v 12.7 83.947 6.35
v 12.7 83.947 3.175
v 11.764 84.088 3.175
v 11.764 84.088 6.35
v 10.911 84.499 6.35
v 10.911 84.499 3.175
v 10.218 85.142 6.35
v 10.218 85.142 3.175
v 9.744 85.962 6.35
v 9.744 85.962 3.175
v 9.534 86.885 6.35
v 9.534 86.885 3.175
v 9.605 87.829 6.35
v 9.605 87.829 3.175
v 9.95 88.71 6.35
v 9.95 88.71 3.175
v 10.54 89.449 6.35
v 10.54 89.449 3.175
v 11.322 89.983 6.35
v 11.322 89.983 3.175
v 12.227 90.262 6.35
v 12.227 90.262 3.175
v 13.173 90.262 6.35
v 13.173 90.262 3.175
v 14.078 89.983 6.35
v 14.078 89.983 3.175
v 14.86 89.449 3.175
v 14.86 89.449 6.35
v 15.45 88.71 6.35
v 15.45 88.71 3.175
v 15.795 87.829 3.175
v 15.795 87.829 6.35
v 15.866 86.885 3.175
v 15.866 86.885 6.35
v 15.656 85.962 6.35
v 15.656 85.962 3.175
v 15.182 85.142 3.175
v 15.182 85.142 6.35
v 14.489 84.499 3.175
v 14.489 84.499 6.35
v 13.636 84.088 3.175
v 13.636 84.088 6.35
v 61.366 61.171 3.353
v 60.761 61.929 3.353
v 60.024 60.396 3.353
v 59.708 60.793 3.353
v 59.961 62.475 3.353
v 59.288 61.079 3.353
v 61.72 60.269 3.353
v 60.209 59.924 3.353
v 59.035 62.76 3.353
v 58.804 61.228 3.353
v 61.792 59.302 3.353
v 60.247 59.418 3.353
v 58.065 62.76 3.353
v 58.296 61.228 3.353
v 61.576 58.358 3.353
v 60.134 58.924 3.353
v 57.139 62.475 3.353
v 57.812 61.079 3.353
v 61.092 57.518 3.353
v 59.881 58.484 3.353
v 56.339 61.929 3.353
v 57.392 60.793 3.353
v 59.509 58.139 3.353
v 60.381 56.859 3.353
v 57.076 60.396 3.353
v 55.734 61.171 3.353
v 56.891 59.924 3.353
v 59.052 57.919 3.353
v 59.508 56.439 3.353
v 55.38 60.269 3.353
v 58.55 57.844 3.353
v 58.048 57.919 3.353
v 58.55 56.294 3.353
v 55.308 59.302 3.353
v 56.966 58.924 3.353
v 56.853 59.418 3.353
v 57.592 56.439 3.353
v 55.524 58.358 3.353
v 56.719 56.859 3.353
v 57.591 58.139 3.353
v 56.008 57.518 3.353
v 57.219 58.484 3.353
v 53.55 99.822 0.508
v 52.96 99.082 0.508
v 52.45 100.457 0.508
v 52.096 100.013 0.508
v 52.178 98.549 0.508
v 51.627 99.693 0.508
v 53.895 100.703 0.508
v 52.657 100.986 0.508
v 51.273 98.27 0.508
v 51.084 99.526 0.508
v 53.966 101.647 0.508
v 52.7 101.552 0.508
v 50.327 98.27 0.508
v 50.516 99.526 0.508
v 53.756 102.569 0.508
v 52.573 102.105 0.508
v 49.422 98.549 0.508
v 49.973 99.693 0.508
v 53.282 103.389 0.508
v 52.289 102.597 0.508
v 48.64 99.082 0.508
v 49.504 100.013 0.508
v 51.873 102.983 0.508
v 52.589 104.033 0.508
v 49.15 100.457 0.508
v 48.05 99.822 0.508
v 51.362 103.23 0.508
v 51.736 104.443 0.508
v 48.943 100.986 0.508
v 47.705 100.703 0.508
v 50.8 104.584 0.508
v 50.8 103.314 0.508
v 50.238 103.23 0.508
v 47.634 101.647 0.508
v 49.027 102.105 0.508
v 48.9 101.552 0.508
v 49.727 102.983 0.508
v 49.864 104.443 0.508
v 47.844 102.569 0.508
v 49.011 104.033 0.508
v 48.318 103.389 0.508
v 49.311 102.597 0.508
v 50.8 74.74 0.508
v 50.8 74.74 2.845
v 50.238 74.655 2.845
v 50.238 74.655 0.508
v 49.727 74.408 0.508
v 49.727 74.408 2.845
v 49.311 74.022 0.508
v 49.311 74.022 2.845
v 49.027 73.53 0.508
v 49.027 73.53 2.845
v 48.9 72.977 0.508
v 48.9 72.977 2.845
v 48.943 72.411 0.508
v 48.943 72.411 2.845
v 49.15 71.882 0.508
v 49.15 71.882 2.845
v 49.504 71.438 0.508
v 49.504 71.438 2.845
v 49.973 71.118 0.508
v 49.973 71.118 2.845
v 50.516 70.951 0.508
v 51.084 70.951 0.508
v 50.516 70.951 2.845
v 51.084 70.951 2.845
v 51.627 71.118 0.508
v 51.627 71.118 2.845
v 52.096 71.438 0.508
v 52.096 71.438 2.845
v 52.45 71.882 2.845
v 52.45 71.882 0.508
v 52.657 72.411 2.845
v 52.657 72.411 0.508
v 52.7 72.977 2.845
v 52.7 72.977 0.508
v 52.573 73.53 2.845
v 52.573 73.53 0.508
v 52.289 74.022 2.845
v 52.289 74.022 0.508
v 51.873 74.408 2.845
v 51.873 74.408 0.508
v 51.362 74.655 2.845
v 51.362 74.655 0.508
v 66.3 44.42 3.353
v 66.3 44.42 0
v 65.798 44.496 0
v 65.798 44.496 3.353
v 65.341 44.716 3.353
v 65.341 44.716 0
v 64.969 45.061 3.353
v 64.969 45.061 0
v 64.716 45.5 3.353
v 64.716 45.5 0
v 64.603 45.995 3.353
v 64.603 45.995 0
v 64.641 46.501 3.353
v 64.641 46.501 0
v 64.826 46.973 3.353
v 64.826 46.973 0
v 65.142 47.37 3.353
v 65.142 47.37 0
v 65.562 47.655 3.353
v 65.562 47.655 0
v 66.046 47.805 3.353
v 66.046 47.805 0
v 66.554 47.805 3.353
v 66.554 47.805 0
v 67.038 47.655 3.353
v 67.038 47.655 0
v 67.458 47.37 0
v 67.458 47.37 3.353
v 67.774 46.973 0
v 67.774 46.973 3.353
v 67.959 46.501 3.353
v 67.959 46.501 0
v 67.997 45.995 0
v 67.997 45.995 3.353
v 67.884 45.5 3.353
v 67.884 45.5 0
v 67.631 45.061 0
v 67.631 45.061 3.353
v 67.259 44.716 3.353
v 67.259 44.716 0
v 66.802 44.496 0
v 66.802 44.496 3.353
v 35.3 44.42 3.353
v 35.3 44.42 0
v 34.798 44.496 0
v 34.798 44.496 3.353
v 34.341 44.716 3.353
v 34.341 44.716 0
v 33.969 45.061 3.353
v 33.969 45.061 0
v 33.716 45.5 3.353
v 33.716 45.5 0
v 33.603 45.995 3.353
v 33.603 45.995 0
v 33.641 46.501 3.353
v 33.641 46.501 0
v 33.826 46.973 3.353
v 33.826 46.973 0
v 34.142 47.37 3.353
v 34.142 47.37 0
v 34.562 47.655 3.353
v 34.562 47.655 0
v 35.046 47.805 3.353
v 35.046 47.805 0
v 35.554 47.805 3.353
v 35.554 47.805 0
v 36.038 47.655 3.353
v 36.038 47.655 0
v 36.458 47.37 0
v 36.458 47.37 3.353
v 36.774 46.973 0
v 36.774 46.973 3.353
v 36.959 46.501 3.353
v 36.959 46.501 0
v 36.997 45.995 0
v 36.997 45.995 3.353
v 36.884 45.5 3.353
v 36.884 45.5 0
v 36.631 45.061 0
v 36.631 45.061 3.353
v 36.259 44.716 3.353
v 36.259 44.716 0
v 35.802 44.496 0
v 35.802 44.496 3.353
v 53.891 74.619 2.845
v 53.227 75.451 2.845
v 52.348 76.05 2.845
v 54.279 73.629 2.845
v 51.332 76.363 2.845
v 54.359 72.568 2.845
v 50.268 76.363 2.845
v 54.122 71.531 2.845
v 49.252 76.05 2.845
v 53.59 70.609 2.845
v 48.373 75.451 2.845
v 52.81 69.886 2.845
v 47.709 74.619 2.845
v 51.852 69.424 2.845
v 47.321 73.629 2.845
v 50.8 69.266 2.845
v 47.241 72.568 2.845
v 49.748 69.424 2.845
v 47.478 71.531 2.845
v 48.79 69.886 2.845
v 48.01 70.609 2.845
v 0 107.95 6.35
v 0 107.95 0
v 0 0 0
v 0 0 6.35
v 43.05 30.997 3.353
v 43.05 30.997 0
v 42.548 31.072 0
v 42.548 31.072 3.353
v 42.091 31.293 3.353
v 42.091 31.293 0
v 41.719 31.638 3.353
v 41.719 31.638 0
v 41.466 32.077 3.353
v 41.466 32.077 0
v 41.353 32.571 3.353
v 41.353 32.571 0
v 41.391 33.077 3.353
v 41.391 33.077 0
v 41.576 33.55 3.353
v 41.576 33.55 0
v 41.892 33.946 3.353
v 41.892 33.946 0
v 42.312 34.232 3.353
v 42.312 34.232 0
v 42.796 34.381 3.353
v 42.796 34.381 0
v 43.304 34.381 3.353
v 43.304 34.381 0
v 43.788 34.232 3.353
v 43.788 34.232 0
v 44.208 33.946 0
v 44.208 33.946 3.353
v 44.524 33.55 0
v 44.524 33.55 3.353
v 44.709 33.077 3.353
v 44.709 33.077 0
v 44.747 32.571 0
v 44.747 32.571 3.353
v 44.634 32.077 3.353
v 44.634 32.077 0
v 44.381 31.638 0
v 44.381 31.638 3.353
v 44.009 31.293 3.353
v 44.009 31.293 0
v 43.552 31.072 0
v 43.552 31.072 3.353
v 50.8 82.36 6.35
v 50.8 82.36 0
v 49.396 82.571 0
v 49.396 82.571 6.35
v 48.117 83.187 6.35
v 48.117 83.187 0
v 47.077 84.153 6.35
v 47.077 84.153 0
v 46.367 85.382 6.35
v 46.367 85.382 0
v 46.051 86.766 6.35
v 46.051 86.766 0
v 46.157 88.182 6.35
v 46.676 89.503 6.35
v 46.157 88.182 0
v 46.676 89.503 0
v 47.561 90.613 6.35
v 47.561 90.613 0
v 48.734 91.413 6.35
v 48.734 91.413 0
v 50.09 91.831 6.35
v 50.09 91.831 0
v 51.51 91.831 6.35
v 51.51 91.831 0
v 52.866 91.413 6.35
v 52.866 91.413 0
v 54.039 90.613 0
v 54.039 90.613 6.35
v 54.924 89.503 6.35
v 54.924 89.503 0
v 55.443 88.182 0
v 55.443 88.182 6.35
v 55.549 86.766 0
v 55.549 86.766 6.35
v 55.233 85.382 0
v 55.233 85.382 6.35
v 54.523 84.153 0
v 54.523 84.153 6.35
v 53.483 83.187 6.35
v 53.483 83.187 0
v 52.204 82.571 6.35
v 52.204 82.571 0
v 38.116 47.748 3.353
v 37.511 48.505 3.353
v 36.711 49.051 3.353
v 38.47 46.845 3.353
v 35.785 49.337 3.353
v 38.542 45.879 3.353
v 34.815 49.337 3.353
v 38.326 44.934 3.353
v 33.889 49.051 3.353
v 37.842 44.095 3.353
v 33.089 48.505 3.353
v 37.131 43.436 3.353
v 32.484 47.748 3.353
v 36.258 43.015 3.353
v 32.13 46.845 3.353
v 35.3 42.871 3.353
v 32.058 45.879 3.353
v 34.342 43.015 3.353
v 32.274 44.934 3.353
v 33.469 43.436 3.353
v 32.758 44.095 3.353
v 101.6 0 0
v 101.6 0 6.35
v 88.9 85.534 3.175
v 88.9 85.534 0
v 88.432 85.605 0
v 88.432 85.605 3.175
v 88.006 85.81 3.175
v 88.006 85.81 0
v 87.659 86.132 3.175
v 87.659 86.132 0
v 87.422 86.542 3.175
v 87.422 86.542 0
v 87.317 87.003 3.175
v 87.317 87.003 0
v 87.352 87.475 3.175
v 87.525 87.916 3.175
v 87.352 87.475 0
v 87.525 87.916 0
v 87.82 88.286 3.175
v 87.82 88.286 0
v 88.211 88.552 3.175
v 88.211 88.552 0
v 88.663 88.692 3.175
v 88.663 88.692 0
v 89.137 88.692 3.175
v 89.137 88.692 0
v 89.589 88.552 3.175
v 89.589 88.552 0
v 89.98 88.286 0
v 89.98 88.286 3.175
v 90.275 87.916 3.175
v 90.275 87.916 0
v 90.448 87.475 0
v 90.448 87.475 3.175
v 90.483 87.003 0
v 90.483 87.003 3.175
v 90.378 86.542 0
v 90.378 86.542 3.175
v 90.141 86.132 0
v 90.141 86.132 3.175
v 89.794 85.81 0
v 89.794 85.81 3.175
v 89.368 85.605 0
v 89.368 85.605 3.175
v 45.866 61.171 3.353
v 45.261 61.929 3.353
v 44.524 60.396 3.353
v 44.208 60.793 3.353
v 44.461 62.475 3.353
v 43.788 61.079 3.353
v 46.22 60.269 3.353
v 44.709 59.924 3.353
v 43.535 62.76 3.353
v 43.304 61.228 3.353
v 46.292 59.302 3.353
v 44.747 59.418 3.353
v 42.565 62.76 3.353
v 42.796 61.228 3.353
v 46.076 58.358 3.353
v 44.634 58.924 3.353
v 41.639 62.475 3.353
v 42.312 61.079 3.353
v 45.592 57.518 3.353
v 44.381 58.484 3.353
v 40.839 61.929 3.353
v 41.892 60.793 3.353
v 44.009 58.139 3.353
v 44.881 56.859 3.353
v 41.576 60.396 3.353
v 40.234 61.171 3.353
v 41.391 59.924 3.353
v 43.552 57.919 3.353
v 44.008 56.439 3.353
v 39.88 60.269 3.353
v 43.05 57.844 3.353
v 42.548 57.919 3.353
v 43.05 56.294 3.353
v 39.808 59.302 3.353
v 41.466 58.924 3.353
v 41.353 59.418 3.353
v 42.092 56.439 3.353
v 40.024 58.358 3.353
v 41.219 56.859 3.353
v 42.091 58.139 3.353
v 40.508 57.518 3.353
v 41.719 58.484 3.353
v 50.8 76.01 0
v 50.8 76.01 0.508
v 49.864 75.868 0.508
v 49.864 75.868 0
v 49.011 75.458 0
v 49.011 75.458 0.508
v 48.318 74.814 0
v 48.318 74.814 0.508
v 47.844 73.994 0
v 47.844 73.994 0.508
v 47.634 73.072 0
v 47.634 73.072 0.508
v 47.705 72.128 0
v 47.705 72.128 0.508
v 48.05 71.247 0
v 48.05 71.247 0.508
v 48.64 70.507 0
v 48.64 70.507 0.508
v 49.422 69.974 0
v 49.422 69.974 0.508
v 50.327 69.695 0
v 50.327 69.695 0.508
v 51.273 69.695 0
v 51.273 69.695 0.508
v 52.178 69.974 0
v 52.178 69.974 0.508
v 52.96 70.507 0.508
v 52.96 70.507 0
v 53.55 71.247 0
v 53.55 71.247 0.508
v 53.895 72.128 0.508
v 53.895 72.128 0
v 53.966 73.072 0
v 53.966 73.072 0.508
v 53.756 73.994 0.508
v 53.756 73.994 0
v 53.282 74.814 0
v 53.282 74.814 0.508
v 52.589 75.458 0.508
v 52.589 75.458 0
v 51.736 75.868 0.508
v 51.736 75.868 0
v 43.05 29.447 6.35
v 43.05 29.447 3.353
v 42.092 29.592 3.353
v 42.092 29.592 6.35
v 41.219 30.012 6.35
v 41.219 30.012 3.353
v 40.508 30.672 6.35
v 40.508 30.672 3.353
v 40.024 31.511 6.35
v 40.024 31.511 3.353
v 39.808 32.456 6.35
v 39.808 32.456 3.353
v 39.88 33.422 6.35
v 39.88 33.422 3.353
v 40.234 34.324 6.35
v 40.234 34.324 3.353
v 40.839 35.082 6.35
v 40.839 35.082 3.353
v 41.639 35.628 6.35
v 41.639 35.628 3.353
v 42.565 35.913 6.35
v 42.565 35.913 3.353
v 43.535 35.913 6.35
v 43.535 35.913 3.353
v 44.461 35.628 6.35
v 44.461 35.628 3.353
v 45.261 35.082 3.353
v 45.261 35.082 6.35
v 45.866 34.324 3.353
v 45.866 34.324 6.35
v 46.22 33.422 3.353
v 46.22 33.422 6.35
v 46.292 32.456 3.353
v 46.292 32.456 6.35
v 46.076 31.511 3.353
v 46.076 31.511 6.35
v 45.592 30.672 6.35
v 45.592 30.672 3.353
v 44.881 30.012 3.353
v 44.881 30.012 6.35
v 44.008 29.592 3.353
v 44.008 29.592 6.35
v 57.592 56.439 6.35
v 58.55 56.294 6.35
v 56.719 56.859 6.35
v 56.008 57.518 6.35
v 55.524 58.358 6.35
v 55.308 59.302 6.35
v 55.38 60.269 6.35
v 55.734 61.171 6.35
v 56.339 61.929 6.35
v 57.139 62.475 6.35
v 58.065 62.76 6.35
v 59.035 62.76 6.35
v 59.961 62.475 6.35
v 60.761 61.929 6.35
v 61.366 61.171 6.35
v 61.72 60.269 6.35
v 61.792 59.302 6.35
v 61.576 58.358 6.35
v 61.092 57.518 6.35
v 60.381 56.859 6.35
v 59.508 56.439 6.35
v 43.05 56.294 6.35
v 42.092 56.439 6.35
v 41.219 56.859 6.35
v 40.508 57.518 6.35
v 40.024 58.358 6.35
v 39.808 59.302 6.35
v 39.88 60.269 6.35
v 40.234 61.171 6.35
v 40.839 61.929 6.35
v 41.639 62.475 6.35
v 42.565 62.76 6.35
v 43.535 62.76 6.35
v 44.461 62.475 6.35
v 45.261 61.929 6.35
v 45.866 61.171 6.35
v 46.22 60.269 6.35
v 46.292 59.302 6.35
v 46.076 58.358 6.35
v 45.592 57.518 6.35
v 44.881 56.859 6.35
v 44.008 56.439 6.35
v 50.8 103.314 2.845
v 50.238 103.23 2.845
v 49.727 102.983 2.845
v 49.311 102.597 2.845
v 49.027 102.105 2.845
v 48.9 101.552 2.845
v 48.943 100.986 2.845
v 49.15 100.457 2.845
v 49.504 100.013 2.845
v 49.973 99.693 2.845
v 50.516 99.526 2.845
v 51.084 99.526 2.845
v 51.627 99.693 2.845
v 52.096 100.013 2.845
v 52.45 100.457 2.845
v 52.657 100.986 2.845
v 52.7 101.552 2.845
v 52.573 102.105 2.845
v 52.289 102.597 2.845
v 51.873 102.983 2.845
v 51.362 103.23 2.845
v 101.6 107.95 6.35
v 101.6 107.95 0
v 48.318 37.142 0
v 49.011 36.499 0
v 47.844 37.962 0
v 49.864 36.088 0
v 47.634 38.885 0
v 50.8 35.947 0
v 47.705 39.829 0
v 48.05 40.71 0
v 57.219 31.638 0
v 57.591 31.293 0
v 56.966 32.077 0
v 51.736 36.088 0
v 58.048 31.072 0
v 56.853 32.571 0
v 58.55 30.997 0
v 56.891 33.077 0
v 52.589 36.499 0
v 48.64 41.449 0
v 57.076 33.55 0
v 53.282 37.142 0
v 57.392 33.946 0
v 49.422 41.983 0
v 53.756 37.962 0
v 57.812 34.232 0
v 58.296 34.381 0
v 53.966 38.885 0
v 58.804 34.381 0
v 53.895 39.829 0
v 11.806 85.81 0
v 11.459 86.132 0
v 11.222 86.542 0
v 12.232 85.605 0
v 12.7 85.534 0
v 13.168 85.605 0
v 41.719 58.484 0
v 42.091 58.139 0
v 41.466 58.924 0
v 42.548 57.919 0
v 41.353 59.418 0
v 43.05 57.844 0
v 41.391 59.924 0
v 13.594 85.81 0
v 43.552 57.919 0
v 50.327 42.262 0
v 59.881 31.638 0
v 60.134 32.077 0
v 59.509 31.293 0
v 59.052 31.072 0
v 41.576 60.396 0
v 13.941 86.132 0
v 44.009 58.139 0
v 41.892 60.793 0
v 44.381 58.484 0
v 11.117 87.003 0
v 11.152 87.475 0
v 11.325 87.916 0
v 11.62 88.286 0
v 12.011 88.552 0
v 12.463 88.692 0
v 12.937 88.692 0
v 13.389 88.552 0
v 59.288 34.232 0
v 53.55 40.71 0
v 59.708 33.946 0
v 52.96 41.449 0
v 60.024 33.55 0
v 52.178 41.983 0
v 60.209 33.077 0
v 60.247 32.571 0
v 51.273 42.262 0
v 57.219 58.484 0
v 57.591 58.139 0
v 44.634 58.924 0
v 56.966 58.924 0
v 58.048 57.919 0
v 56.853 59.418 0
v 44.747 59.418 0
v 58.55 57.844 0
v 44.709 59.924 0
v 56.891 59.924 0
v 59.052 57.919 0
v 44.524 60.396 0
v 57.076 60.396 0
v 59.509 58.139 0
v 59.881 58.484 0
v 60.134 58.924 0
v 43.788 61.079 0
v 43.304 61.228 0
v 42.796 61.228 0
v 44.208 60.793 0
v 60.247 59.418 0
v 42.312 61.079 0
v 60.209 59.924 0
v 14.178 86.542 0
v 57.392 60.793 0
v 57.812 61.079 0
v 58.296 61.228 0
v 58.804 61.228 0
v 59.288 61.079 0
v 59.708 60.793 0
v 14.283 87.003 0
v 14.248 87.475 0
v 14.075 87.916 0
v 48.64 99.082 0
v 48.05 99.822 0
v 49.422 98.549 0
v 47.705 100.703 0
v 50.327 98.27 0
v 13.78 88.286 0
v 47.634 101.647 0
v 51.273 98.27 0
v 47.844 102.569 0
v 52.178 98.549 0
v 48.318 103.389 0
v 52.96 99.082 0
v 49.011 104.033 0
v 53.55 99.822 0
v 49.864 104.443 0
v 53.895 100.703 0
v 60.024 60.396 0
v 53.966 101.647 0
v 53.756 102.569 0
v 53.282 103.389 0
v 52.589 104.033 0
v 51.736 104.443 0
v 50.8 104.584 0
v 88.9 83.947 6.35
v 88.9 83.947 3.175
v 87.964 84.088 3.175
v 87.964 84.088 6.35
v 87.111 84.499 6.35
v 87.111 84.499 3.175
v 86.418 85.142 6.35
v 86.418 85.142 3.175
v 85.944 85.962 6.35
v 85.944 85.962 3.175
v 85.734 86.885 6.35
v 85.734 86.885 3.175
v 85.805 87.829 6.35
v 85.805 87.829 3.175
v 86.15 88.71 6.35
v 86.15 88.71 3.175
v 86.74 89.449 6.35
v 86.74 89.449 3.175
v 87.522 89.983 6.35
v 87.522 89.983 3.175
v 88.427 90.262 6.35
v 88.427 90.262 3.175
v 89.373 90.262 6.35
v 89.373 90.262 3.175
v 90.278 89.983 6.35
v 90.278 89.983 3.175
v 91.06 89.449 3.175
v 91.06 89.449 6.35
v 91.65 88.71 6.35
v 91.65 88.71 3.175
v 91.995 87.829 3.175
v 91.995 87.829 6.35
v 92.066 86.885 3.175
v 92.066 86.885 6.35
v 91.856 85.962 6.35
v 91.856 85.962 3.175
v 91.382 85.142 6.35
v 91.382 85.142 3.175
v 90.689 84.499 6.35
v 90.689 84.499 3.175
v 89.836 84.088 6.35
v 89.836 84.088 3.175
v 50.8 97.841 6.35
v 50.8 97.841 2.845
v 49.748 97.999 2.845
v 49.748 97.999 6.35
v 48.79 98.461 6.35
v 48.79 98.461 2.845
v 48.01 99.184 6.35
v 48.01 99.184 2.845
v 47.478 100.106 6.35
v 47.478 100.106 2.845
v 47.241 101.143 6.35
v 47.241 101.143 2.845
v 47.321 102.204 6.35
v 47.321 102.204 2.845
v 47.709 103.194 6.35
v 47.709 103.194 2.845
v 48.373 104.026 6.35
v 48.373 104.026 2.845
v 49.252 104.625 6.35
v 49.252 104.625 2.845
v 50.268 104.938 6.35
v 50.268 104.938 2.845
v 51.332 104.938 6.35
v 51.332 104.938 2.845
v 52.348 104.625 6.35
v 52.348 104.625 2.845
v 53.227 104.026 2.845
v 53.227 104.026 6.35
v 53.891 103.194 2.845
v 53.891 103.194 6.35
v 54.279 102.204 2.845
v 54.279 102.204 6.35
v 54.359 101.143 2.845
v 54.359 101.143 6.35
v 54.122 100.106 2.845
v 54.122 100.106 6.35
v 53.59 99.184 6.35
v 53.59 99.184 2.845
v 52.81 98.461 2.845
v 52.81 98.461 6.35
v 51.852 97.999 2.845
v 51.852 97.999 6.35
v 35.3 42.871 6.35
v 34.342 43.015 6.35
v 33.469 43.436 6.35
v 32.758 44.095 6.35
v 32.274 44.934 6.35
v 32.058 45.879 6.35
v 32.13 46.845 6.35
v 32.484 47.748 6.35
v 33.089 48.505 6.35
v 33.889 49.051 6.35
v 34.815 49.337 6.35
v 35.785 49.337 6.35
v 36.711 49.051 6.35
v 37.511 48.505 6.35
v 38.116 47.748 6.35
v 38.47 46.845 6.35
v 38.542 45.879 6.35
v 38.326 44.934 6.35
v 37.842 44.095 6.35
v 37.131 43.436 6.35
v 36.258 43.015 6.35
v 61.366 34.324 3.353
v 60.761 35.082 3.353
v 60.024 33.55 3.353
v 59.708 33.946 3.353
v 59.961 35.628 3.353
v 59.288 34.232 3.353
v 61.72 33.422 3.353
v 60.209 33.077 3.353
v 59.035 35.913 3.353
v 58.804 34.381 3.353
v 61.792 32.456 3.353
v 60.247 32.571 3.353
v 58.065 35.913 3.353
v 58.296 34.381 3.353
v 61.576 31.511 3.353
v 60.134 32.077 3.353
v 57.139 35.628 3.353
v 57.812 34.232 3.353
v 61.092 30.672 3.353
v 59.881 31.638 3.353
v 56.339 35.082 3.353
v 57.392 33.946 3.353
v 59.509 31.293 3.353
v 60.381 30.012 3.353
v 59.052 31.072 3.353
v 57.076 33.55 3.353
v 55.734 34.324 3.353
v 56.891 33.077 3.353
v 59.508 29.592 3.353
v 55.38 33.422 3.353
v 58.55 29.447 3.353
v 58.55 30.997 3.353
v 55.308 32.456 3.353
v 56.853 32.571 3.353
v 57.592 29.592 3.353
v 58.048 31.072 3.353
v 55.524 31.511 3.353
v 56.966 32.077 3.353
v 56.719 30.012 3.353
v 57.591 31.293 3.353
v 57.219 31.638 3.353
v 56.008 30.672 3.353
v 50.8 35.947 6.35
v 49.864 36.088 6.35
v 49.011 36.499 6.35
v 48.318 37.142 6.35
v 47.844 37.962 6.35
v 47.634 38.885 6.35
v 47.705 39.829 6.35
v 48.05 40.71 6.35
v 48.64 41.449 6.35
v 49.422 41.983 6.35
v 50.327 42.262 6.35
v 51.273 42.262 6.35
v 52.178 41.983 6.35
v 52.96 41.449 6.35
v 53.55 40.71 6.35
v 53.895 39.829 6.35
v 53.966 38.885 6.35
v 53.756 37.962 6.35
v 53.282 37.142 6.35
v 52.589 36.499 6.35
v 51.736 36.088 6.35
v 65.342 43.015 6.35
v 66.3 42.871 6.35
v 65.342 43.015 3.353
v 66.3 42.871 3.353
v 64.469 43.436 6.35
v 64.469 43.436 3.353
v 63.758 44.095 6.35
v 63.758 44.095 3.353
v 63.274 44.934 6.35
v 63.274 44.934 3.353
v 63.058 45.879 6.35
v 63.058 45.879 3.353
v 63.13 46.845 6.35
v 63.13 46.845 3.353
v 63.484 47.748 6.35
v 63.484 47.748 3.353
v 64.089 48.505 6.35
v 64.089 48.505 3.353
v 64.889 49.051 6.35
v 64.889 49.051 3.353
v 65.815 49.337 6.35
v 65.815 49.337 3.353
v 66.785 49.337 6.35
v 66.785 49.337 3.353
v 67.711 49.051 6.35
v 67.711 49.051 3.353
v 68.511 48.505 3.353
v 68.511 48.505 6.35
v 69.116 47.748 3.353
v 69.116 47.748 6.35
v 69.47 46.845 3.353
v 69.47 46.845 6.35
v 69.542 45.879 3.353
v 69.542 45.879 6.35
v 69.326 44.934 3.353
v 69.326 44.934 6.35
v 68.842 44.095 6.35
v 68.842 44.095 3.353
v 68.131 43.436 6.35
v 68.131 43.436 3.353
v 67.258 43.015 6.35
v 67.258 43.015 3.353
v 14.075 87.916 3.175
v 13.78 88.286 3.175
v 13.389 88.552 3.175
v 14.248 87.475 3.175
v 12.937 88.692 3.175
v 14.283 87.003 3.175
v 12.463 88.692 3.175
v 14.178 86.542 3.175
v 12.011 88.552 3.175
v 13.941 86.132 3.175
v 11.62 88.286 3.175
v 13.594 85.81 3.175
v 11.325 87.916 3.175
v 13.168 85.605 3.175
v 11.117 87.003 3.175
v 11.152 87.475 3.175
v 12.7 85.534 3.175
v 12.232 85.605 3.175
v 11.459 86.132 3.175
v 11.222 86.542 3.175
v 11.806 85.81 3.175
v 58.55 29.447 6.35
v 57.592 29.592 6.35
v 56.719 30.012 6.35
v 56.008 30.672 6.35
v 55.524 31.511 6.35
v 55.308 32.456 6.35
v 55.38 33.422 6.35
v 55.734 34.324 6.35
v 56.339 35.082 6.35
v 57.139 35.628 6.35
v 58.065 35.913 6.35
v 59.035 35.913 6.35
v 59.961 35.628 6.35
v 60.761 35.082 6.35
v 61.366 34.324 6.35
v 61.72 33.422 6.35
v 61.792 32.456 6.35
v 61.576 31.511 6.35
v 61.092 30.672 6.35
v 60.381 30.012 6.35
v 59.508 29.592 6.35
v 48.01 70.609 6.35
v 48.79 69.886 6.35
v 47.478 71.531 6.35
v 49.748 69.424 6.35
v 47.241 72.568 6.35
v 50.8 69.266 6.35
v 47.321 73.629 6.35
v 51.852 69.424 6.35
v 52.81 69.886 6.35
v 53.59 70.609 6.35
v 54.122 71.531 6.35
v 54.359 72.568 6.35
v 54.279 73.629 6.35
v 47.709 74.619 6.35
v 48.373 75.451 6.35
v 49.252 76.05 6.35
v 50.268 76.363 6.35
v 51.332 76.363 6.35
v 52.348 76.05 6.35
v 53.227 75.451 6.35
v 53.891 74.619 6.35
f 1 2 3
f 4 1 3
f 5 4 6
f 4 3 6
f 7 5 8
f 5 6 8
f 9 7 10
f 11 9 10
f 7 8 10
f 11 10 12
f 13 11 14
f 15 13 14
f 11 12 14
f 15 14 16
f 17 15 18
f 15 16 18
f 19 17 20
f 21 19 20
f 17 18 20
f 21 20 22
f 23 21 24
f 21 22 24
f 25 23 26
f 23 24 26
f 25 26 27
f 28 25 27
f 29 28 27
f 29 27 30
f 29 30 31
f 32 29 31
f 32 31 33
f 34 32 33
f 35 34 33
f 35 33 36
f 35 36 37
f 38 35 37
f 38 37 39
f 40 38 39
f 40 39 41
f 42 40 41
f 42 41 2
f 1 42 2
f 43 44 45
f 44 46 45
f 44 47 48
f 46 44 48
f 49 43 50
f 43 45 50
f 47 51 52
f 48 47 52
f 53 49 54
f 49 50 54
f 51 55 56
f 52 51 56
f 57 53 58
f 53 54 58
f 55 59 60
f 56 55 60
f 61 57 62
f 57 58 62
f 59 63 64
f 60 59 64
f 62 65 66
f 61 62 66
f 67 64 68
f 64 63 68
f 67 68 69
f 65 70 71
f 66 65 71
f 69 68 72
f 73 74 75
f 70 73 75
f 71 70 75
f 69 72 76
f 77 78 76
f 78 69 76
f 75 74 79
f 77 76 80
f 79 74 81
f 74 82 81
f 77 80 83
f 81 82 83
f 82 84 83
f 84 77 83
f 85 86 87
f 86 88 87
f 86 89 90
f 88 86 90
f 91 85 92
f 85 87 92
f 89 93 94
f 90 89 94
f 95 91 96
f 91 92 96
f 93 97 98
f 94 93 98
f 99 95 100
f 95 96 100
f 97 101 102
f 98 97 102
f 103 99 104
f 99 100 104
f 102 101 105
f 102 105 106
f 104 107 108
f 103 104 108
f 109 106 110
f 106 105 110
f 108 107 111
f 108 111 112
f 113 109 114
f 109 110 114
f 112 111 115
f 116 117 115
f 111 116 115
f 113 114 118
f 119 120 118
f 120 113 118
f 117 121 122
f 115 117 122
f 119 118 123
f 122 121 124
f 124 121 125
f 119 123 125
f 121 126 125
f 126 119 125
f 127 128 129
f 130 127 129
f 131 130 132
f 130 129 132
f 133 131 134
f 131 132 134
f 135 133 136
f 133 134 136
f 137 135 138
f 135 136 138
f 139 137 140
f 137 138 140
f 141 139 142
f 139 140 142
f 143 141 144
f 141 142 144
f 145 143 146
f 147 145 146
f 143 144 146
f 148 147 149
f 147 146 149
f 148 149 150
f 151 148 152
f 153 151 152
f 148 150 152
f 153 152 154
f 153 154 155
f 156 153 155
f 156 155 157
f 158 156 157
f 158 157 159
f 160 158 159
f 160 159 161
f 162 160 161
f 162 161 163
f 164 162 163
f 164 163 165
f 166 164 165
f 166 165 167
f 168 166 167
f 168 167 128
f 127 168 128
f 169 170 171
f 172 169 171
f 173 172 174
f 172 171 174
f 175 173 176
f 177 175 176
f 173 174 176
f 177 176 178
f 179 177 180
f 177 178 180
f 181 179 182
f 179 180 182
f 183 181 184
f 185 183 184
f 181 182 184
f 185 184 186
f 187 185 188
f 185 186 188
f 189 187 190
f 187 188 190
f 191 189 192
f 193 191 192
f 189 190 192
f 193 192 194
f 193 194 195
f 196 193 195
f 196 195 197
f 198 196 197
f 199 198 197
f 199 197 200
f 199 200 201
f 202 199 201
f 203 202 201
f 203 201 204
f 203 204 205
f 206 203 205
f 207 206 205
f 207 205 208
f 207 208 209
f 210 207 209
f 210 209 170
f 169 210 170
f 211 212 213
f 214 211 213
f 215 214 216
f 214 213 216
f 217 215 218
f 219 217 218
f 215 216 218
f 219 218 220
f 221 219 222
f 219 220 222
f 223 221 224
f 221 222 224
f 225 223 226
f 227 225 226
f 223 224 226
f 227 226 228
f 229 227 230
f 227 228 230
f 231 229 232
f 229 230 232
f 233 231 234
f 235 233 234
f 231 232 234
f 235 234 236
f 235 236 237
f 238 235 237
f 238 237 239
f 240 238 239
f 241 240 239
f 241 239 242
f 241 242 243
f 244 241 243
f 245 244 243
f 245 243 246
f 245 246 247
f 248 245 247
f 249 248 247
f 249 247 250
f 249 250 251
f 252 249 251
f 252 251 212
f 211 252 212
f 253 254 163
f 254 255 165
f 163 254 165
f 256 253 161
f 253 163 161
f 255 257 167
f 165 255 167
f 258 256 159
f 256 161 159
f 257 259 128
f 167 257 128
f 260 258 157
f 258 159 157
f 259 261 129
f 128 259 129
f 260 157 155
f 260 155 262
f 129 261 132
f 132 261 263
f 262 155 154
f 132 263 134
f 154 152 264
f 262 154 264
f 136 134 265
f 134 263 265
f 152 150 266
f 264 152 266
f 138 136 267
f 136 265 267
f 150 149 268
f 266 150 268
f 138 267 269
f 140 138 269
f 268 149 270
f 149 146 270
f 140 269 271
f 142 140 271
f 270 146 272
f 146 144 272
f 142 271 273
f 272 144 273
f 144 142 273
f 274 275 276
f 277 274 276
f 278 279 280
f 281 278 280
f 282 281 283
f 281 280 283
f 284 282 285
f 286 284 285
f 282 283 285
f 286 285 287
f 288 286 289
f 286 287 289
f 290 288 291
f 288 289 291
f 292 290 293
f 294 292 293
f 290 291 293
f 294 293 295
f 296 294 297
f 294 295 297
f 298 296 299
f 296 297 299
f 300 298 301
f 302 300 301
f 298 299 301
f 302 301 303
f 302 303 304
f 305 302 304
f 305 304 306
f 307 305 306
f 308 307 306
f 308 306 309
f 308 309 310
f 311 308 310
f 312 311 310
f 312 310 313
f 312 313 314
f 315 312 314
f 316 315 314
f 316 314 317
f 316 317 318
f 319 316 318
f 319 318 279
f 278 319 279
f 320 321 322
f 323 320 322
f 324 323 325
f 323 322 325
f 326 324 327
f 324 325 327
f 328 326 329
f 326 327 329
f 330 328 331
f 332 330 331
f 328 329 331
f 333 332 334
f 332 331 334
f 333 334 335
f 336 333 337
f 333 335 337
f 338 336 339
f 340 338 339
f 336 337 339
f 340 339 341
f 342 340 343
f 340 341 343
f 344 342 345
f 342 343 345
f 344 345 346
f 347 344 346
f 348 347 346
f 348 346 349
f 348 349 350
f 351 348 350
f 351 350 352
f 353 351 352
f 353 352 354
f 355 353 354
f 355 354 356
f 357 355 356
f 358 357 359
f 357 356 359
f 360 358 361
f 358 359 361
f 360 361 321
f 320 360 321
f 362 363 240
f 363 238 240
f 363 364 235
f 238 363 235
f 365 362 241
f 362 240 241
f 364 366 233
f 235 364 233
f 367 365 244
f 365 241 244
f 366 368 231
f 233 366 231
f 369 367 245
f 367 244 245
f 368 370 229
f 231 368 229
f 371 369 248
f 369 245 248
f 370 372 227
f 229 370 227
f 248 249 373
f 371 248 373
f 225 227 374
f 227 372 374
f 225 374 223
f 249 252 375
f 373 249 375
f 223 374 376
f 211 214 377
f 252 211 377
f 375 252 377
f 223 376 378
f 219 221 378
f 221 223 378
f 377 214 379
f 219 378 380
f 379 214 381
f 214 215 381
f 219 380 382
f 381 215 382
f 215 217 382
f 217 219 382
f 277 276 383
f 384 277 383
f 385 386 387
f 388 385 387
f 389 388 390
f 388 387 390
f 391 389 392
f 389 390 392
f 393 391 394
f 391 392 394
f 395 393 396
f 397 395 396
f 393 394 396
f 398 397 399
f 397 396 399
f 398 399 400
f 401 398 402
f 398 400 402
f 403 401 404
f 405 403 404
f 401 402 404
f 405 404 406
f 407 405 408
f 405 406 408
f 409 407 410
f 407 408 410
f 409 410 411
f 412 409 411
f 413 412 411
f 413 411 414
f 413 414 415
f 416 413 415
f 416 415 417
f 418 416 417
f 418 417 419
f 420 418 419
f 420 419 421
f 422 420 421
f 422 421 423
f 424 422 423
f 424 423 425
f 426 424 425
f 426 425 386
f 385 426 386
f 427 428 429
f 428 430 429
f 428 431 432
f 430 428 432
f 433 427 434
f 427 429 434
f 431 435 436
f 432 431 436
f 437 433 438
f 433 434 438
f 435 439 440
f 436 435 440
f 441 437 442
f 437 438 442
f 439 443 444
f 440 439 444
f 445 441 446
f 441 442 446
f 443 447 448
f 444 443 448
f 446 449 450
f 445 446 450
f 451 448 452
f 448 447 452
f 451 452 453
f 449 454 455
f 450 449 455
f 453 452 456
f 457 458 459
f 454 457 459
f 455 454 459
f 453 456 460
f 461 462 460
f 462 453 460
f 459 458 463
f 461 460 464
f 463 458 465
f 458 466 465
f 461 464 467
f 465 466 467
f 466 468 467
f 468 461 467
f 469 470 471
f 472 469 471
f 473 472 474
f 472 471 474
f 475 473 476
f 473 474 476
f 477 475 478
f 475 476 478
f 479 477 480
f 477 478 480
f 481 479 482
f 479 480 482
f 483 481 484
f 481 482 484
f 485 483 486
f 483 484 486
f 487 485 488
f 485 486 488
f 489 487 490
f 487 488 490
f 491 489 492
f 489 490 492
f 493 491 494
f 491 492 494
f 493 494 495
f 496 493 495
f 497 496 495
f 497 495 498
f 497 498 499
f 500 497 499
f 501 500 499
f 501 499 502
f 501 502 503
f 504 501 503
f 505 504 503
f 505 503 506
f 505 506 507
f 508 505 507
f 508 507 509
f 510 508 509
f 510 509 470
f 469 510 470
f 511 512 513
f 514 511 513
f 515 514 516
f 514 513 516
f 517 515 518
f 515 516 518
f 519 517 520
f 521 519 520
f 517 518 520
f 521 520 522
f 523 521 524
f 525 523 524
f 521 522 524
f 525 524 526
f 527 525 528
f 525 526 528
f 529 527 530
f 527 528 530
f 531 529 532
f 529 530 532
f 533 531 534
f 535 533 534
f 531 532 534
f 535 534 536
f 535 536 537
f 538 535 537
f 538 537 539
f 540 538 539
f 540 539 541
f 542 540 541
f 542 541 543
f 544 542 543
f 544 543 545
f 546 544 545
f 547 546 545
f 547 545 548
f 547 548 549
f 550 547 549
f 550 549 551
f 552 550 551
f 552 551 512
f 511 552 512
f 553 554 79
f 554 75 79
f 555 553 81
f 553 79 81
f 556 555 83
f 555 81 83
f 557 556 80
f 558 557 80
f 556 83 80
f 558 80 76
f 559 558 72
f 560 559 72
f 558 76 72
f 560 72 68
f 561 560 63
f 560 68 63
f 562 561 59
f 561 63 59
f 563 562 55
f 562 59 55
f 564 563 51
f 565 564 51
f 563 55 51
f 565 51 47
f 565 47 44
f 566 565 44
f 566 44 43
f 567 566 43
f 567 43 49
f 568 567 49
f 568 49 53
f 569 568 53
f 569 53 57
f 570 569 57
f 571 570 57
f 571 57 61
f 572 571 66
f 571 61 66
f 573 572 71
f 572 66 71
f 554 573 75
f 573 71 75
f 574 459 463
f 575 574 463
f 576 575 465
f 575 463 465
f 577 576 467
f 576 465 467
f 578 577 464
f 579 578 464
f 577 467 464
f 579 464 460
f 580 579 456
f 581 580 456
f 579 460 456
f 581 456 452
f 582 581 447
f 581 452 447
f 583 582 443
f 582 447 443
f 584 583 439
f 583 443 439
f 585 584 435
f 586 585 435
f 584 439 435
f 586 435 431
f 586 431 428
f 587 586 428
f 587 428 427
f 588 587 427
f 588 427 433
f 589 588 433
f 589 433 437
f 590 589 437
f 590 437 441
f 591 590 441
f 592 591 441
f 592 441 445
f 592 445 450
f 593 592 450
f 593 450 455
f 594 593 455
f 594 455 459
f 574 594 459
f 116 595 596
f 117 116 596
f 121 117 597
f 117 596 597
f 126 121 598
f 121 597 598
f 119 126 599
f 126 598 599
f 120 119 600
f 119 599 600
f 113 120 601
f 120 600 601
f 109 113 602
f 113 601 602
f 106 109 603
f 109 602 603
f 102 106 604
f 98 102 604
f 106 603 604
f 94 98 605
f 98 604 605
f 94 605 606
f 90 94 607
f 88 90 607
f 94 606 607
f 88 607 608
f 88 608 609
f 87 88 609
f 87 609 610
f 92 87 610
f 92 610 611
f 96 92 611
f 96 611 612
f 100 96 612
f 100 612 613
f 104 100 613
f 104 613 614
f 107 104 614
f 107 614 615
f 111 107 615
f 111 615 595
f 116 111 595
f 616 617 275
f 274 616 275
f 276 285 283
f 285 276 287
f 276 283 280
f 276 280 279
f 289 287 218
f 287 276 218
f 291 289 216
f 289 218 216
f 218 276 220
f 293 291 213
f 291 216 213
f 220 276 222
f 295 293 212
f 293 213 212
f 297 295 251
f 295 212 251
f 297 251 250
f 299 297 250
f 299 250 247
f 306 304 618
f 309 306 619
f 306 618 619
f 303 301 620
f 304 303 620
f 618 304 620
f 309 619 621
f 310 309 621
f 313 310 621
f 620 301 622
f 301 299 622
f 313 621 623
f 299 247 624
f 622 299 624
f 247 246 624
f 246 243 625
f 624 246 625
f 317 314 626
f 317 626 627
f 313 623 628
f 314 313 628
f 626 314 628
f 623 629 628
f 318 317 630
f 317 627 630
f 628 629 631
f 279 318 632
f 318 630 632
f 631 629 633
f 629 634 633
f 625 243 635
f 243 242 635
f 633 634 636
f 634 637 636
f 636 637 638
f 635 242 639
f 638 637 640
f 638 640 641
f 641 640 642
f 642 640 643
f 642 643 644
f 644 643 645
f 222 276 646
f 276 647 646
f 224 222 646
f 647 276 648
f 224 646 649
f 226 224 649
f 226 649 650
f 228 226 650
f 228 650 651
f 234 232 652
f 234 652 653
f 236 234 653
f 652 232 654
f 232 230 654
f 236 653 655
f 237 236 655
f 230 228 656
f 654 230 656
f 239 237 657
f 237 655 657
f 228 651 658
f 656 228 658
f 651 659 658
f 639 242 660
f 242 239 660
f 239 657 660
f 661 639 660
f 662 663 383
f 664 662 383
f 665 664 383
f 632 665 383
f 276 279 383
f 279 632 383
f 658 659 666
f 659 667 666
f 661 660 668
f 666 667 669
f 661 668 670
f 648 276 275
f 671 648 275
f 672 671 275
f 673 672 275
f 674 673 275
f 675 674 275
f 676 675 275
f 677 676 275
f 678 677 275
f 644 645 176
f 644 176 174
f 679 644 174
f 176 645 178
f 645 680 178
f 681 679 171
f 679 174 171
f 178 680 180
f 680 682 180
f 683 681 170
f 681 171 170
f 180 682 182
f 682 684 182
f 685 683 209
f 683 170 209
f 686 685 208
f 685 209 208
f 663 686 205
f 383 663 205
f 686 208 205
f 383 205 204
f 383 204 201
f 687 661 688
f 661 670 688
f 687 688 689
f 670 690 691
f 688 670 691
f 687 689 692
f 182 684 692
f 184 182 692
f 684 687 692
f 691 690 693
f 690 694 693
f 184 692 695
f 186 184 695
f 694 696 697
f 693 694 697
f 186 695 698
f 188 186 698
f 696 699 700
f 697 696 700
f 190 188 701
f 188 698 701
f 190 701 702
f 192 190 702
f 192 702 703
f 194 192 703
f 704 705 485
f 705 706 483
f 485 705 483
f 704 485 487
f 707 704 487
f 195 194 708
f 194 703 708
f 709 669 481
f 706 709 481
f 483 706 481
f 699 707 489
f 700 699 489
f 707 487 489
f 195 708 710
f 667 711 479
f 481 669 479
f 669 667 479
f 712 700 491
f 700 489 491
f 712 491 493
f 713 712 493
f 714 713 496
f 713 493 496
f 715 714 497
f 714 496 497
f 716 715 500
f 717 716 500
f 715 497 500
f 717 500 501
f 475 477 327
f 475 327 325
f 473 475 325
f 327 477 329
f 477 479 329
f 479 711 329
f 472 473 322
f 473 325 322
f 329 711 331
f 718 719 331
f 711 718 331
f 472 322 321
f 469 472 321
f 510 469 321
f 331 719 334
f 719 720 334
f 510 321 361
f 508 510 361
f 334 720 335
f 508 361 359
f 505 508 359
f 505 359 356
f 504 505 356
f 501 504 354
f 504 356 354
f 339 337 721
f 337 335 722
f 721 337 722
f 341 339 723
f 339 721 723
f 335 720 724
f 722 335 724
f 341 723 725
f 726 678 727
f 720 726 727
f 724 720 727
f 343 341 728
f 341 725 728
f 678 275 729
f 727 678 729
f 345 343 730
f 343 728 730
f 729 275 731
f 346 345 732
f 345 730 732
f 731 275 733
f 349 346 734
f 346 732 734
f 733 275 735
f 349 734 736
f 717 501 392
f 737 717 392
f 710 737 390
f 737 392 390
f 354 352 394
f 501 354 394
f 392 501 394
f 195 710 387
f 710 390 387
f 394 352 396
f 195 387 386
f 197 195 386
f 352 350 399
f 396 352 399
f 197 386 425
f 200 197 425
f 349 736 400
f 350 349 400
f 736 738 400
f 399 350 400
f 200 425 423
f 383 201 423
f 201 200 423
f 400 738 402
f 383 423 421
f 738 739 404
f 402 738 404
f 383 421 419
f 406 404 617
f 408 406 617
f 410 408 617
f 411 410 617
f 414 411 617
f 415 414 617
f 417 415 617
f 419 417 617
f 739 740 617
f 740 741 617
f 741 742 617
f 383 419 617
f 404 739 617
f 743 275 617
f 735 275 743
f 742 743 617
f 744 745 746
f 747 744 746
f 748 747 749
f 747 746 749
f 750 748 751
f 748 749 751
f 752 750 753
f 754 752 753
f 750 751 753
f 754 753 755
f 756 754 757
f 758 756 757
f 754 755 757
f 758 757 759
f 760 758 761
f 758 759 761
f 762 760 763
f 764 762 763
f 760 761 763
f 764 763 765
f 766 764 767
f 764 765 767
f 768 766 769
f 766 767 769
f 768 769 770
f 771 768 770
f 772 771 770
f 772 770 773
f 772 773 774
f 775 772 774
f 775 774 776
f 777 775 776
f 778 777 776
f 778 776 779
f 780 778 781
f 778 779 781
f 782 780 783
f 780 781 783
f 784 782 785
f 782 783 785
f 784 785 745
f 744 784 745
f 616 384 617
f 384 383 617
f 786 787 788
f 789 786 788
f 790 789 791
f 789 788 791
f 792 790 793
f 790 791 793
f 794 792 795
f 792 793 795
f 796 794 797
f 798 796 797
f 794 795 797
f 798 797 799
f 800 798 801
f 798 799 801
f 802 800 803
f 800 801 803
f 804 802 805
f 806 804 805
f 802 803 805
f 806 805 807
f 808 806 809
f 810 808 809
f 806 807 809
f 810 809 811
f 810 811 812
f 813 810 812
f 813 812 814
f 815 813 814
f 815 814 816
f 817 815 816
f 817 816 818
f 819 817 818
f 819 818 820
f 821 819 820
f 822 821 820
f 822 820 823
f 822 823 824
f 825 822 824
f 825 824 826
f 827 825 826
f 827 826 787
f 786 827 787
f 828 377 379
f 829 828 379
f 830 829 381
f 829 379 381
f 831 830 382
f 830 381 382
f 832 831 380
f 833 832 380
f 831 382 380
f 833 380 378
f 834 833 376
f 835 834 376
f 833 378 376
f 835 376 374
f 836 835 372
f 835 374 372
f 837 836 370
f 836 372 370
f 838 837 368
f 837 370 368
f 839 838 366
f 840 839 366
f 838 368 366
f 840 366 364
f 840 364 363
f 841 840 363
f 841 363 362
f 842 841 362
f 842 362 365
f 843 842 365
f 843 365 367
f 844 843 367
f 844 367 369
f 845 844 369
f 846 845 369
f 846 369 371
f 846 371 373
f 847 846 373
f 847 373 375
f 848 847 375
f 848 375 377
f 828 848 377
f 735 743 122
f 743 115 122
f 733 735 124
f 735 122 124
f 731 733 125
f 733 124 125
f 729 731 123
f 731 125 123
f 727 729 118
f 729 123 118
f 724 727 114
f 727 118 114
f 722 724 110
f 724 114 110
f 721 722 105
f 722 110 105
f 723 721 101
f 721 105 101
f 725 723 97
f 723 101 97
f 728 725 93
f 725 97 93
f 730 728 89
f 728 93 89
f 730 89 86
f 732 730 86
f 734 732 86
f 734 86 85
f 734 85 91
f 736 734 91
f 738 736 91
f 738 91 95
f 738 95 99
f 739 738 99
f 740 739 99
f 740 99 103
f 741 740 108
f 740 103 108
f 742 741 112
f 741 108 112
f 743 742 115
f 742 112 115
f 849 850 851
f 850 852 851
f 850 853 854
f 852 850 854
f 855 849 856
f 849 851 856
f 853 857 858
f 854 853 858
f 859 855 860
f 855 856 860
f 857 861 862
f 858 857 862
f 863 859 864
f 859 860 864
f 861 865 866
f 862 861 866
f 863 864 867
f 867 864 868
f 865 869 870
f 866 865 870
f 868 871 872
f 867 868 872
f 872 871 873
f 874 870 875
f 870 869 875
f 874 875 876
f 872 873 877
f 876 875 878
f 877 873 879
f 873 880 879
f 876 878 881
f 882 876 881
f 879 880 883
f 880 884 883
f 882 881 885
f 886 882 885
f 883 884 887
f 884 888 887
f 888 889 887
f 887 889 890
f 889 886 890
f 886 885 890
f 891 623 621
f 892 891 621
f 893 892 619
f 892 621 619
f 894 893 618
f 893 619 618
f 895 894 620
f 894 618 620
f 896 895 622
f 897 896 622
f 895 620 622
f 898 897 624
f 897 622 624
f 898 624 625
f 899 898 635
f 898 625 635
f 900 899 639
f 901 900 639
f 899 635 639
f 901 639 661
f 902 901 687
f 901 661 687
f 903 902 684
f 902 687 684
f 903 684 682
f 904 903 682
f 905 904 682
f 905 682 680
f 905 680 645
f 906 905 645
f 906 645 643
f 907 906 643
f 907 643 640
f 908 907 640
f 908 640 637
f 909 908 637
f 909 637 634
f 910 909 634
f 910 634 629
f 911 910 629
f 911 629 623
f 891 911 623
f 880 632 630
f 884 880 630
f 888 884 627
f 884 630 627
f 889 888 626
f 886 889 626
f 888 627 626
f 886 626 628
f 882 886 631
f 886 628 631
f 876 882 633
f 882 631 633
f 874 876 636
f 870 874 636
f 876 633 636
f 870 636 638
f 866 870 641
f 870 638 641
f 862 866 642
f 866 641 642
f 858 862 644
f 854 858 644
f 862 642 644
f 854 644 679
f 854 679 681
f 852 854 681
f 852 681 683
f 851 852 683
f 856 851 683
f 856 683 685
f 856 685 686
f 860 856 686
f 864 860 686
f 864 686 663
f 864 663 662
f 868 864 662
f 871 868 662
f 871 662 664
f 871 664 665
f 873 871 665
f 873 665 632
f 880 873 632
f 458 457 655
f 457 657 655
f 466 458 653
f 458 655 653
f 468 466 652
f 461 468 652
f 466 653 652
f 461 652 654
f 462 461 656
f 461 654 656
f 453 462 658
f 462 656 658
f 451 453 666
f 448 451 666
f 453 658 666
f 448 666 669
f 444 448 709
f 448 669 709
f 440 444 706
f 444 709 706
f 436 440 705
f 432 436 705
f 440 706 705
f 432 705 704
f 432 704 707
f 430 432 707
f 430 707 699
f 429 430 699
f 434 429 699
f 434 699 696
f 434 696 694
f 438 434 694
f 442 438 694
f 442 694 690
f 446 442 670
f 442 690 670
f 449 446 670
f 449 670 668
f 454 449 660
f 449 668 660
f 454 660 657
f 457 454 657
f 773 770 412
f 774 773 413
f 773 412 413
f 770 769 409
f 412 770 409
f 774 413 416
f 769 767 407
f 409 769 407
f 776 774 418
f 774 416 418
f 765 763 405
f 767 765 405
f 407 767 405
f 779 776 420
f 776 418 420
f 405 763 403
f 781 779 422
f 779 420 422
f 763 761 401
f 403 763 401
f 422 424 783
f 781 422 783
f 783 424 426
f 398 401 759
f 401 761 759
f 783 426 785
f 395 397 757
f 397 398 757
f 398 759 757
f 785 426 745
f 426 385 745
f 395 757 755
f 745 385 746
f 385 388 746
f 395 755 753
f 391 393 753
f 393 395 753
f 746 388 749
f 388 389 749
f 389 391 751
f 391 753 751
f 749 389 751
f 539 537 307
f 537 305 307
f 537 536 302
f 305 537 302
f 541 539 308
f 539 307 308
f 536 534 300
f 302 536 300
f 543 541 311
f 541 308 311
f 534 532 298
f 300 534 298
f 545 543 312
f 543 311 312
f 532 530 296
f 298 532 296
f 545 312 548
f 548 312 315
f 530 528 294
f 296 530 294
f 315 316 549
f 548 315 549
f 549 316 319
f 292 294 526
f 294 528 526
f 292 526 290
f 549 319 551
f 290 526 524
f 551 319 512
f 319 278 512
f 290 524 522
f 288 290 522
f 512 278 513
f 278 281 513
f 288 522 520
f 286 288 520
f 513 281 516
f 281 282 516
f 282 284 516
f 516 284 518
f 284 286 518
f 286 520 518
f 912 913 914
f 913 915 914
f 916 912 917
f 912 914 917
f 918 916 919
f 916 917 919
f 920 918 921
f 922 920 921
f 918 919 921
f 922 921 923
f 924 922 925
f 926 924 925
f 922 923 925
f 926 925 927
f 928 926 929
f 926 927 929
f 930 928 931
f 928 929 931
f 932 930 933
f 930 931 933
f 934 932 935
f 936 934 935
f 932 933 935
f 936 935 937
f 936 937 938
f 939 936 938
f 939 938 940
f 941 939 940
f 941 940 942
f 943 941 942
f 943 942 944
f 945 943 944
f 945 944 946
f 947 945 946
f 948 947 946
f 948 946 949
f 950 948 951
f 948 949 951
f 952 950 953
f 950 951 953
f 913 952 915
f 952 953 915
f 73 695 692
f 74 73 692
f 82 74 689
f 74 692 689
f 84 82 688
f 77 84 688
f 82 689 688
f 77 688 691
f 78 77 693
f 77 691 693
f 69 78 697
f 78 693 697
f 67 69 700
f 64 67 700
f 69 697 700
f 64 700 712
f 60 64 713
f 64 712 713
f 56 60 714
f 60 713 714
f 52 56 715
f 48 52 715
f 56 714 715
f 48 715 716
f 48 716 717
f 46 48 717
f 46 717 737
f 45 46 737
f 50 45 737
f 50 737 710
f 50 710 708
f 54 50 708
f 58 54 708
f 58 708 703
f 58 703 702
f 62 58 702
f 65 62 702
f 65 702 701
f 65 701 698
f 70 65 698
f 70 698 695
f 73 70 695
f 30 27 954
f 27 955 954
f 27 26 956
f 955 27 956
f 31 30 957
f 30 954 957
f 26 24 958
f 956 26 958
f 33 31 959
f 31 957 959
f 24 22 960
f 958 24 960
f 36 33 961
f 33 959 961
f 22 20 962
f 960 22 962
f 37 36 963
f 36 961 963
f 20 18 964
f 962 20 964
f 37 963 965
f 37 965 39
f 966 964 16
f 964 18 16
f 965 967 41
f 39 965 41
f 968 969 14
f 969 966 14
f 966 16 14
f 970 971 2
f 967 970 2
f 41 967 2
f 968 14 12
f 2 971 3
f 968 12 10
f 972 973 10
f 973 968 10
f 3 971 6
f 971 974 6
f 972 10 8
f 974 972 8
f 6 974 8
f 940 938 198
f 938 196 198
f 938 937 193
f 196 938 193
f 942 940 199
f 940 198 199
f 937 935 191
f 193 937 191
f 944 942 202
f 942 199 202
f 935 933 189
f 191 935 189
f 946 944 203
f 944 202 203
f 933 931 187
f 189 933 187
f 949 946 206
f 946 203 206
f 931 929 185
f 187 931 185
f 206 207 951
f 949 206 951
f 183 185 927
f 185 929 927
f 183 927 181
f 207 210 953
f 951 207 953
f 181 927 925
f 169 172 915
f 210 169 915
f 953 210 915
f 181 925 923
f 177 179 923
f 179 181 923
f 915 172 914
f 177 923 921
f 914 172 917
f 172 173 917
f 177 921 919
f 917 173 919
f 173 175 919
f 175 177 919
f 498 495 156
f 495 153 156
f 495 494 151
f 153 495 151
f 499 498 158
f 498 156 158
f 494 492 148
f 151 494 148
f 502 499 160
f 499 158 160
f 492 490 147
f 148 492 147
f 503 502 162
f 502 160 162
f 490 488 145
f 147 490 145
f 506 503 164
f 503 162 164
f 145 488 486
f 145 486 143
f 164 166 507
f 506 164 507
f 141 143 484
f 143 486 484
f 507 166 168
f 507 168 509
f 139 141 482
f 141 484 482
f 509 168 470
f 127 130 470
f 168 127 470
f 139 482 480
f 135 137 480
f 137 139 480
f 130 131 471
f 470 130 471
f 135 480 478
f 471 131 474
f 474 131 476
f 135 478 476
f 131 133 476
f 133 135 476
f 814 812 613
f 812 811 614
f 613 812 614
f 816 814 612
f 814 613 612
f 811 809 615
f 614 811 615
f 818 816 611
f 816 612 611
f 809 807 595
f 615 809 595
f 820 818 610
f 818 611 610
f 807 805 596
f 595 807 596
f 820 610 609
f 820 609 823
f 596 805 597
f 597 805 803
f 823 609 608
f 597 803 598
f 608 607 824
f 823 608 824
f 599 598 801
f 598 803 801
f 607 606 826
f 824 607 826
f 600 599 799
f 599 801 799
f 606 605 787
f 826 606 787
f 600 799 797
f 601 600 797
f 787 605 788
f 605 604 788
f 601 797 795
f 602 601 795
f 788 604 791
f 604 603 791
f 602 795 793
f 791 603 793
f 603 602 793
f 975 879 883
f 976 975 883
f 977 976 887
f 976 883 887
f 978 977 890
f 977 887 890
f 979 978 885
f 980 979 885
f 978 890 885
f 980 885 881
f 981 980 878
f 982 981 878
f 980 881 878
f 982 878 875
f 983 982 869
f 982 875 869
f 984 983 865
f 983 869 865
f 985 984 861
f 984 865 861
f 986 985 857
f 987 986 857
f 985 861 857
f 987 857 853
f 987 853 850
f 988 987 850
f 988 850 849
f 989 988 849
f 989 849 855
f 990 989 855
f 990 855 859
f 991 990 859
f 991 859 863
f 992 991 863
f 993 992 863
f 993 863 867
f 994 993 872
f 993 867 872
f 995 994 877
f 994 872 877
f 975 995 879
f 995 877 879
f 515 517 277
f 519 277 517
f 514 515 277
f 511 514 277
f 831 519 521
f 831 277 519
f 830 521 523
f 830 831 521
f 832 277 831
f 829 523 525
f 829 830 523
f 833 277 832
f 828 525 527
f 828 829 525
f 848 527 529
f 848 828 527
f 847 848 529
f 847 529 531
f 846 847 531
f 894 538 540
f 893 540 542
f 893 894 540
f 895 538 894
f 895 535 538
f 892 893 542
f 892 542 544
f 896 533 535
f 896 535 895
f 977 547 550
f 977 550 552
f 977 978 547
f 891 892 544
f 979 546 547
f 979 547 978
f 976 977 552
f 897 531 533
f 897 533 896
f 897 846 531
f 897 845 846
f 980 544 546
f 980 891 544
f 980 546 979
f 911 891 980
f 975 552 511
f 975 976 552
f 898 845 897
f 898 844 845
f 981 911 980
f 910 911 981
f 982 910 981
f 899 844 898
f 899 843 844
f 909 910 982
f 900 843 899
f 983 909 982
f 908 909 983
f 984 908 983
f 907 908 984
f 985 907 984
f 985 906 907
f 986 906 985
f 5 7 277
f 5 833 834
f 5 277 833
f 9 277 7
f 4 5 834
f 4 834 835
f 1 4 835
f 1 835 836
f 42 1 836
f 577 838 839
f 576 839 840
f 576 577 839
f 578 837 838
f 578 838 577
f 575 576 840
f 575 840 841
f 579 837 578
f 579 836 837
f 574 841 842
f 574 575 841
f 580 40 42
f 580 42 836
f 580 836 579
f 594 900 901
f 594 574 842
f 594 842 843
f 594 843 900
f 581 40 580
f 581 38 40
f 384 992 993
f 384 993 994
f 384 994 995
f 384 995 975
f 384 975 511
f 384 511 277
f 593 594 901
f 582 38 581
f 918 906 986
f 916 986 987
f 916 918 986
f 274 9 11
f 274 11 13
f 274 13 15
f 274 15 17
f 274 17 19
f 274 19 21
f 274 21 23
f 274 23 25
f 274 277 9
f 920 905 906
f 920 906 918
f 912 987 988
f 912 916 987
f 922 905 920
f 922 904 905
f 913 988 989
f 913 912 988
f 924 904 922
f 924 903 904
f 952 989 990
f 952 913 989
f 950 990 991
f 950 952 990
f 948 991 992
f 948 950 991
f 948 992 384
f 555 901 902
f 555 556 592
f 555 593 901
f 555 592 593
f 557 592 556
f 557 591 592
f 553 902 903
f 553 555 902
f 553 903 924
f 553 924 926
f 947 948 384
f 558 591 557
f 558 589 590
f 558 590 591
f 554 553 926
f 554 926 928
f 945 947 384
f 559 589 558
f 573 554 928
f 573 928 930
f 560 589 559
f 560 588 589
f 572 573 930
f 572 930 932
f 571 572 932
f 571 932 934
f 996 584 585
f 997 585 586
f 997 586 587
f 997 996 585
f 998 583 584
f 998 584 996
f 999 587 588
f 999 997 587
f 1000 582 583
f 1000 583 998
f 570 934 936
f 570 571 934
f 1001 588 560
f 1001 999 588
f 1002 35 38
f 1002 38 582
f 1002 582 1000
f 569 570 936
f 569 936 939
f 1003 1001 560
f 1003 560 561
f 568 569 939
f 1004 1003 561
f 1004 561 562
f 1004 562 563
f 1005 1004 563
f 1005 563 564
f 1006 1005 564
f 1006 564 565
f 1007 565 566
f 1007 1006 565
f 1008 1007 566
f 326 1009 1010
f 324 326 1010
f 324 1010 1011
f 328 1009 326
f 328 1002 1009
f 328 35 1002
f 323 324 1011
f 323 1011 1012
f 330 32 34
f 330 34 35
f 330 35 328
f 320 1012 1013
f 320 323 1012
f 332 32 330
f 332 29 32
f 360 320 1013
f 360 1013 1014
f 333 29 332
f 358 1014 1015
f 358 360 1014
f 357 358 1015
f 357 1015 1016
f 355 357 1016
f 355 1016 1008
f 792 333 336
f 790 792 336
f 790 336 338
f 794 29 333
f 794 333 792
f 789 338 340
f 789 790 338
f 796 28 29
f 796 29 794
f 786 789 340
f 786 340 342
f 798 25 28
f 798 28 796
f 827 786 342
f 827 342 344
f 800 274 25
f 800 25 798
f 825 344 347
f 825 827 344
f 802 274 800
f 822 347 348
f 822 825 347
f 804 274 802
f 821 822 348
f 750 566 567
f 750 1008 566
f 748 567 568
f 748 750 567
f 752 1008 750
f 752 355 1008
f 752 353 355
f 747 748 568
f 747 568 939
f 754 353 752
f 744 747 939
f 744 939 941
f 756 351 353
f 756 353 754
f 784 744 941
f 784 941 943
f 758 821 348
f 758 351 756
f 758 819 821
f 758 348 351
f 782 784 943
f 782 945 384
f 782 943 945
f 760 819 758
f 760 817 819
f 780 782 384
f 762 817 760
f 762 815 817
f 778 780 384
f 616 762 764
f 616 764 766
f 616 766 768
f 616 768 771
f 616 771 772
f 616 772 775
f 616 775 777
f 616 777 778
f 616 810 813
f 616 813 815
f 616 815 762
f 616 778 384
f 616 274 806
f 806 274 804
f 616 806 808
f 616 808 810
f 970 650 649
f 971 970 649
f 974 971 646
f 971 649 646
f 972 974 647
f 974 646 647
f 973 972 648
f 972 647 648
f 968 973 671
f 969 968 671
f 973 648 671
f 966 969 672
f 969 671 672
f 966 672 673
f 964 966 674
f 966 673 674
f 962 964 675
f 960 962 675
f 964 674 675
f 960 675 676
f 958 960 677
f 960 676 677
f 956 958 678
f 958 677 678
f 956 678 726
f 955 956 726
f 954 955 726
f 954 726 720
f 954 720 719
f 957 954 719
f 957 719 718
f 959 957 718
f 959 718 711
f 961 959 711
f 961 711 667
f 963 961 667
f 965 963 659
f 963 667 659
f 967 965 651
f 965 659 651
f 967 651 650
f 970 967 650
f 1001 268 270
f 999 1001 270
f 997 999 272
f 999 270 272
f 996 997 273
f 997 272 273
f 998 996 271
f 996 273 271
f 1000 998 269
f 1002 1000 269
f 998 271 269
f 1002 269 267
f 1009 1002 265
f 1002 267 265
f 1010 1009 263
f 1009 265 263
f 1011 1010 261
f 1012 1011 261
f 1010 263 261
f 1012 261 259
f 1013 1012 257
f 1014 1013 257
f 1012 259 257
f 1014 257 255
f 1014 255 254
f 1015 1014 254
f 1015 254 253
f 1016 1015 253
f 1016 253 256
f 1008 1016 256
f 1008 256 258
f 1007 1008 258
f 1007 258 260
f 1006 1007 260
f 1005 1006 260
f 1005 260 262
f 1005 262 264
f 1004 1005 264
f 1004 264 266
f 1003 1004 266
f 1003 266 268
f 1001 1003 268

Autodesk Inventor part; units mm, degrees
ref_plane "YZ Plane" through (0, 0, 0) normal (1, 0, 0) x (0, 1, 0)
ref_plane "XZ Plane" through (0, 0, 0) normal (0, 1, 0) x (-1, 0, 0)
ref_plane "XY Plane" through (0, 0, 0) normal (0, 0, 1) x (1, 0, 0)
sketch "Sketch1" plane through (0, 0, 0) normal (0, 0, 1) x (1, 0, 0)
  line L0 (0, 0) -> (101.6, 0)
  line L1 (101.6, 0) -> (101.6, 107.95)
  line L2 (101.6, 107.95) -> (0, 107.95)
  line L3 (0, 107.95) -> (0, 0)
  dimension "d0" = 101.6
  dimension "d1" = 107.95
extrude "Extrusion1" add sketch "Sketch1" along normal blind 6.35
sketch "Sketch2" plane through (0, 0, 6.35) normal (0, 0, 1) x (1, 0, 0)
  line L0 (101.6, 107.95) -> (0, 107.95) projected
  line L1 (101.6, 0) -> (101.6, 107.95) projected
  line L2 (0, 0) -> (101.6, 0) projected
  point P0 (50.8, 87.122)
  point P1 (50.8, 107.95)
  point P2 (101.6, 53.975)
  dimension "d31" = 20.828
hole "Hole1" at (50.8, 87.122, 6.35) direction (0, 0, -1) diameter 9.525 depth 19.05 tip angle 118
sketch "Sketch3" plane through (0, 0, 6.35) normal (0, 0, 1) x (1, 0, 0)
  line L0 (101.6, 107.95) -> (0, 107.95) projected
  line L1 (0, 107.95) -> (0, 0) projected
  circle A0 centre (50.8, 87.122) radius 4.7625 projected
  point P0 (12.7, 87.122)
  point P1 (88.9, 87.122)
  dimension "d12" = 12.7
  dimension "d15" = 76.2
hole "Hole2" at (12.7, 87.122, 6.35) at (88.9, 87.122, 6.35) direction (0, 0, -1) diameter 3.175 depth 19.05 tip angle 118 counterbore diameter 6.35 counterbore depth 3.175
sketch "Sketch4" plane through (0, 0, 6.35) normal (0, 0, 1) x (1, 0, 0)
  circle A0 centre (50.8, 87.122) radius 4.7625 projected
  point P0 (0, 0)
  point P1 (50.8, 39.122)
  dimension "d39" = 48
hole "Hole3" at (50.8, 39.122, 6.35) direction (0, 0, -1) diameter 6.35 depth 19.05 tip angle 118
sketch "Sketch6" plane through (0, 0, 0) normal (0, 0, -1) x (-1, 0, 0)
  circle A0 centre (-50.8, 87.122) radius 4.7625 projected
  point P0 (0, 0)
  point P1 (-50.8, 101.4095)
  point P2 (-50.8, 72.8345)
  dimension "d52" = 28.575
  dimension "d53" = 14.2875
hole "Hole5" at (50.8, 101.4095, 0) at (50.8, 72.8345, 0) direction (0, 0, 1) diameter 3.81 depth 19.05 tip angle 118 counterbore diameter 6.35 counterbore depth 0.508 clearance for "Socket Head Cap Screw" size "#6" standard "Ansi Unified Screw Threads"
sketch "Sketch7" plane through (0, 0, 6.35) normal (0, 0, 1) x (1, 0, 0)
  circle A0 centre (50.8, 101.4095) radius 1.905 projected
  circle A1 centre (50.8, 72.8345) radius 1.905 projected
  point P0 (0, 0)
hole "Hole6" at (50.8, 101.4095, 6.35) at (50.8, 72.8345, 6.35) direction (0, 0, -1) diameter 3.81 depth 19.05 tip angle 118 counterbore diameter 7.1374 counterbore depth 3.5052 clearance for "Socket Head Cap Screw" size "#6" standard "Ansi Unified Screw Threads"
sketch "Sketch8" plane through (0, 0, 6.35) normal (0, 0, 1) x (1, 0, 0)
  circle A0 centre (50.8, 46.122) radius 15.5
  circle A1 centre (50.8, 39.122) radius 3.175 projected
  point P0 (0, 0)
  point P1 (66.3, 46.122)
  point P2 (58.55, 59.5454)
  point P3 (43.05, 59.5454)
  point P4 (35.3, 46.122)
  point P5 (43.05, 32.6986)
  point P6 (58.55, 32.6986)
  dimension "d68" = 31
  dimension "d69" = 7
  dimension "d79" = 360
hole "Hole8" at (66.3, 46.122, 6.35) at (58.55, 59.5454, 6.35) at (43.05, 59.5454, 6.35) at (35.3, 46.122, 6.35) at (43.05, 32.6986, 6.35) at (58.55, 32.6986, 6.35) direction (0, 0, -1) diameter 3.4036 depth 12.2936 tip angle 118 counterbore diameter 6.5024 counterbore depth 2.9972 clearance for "Socket Head Cap Screw" size "M3" standard "Ansi Metric M Profile"
equation "\"d53\" = 0.5 * d52"
